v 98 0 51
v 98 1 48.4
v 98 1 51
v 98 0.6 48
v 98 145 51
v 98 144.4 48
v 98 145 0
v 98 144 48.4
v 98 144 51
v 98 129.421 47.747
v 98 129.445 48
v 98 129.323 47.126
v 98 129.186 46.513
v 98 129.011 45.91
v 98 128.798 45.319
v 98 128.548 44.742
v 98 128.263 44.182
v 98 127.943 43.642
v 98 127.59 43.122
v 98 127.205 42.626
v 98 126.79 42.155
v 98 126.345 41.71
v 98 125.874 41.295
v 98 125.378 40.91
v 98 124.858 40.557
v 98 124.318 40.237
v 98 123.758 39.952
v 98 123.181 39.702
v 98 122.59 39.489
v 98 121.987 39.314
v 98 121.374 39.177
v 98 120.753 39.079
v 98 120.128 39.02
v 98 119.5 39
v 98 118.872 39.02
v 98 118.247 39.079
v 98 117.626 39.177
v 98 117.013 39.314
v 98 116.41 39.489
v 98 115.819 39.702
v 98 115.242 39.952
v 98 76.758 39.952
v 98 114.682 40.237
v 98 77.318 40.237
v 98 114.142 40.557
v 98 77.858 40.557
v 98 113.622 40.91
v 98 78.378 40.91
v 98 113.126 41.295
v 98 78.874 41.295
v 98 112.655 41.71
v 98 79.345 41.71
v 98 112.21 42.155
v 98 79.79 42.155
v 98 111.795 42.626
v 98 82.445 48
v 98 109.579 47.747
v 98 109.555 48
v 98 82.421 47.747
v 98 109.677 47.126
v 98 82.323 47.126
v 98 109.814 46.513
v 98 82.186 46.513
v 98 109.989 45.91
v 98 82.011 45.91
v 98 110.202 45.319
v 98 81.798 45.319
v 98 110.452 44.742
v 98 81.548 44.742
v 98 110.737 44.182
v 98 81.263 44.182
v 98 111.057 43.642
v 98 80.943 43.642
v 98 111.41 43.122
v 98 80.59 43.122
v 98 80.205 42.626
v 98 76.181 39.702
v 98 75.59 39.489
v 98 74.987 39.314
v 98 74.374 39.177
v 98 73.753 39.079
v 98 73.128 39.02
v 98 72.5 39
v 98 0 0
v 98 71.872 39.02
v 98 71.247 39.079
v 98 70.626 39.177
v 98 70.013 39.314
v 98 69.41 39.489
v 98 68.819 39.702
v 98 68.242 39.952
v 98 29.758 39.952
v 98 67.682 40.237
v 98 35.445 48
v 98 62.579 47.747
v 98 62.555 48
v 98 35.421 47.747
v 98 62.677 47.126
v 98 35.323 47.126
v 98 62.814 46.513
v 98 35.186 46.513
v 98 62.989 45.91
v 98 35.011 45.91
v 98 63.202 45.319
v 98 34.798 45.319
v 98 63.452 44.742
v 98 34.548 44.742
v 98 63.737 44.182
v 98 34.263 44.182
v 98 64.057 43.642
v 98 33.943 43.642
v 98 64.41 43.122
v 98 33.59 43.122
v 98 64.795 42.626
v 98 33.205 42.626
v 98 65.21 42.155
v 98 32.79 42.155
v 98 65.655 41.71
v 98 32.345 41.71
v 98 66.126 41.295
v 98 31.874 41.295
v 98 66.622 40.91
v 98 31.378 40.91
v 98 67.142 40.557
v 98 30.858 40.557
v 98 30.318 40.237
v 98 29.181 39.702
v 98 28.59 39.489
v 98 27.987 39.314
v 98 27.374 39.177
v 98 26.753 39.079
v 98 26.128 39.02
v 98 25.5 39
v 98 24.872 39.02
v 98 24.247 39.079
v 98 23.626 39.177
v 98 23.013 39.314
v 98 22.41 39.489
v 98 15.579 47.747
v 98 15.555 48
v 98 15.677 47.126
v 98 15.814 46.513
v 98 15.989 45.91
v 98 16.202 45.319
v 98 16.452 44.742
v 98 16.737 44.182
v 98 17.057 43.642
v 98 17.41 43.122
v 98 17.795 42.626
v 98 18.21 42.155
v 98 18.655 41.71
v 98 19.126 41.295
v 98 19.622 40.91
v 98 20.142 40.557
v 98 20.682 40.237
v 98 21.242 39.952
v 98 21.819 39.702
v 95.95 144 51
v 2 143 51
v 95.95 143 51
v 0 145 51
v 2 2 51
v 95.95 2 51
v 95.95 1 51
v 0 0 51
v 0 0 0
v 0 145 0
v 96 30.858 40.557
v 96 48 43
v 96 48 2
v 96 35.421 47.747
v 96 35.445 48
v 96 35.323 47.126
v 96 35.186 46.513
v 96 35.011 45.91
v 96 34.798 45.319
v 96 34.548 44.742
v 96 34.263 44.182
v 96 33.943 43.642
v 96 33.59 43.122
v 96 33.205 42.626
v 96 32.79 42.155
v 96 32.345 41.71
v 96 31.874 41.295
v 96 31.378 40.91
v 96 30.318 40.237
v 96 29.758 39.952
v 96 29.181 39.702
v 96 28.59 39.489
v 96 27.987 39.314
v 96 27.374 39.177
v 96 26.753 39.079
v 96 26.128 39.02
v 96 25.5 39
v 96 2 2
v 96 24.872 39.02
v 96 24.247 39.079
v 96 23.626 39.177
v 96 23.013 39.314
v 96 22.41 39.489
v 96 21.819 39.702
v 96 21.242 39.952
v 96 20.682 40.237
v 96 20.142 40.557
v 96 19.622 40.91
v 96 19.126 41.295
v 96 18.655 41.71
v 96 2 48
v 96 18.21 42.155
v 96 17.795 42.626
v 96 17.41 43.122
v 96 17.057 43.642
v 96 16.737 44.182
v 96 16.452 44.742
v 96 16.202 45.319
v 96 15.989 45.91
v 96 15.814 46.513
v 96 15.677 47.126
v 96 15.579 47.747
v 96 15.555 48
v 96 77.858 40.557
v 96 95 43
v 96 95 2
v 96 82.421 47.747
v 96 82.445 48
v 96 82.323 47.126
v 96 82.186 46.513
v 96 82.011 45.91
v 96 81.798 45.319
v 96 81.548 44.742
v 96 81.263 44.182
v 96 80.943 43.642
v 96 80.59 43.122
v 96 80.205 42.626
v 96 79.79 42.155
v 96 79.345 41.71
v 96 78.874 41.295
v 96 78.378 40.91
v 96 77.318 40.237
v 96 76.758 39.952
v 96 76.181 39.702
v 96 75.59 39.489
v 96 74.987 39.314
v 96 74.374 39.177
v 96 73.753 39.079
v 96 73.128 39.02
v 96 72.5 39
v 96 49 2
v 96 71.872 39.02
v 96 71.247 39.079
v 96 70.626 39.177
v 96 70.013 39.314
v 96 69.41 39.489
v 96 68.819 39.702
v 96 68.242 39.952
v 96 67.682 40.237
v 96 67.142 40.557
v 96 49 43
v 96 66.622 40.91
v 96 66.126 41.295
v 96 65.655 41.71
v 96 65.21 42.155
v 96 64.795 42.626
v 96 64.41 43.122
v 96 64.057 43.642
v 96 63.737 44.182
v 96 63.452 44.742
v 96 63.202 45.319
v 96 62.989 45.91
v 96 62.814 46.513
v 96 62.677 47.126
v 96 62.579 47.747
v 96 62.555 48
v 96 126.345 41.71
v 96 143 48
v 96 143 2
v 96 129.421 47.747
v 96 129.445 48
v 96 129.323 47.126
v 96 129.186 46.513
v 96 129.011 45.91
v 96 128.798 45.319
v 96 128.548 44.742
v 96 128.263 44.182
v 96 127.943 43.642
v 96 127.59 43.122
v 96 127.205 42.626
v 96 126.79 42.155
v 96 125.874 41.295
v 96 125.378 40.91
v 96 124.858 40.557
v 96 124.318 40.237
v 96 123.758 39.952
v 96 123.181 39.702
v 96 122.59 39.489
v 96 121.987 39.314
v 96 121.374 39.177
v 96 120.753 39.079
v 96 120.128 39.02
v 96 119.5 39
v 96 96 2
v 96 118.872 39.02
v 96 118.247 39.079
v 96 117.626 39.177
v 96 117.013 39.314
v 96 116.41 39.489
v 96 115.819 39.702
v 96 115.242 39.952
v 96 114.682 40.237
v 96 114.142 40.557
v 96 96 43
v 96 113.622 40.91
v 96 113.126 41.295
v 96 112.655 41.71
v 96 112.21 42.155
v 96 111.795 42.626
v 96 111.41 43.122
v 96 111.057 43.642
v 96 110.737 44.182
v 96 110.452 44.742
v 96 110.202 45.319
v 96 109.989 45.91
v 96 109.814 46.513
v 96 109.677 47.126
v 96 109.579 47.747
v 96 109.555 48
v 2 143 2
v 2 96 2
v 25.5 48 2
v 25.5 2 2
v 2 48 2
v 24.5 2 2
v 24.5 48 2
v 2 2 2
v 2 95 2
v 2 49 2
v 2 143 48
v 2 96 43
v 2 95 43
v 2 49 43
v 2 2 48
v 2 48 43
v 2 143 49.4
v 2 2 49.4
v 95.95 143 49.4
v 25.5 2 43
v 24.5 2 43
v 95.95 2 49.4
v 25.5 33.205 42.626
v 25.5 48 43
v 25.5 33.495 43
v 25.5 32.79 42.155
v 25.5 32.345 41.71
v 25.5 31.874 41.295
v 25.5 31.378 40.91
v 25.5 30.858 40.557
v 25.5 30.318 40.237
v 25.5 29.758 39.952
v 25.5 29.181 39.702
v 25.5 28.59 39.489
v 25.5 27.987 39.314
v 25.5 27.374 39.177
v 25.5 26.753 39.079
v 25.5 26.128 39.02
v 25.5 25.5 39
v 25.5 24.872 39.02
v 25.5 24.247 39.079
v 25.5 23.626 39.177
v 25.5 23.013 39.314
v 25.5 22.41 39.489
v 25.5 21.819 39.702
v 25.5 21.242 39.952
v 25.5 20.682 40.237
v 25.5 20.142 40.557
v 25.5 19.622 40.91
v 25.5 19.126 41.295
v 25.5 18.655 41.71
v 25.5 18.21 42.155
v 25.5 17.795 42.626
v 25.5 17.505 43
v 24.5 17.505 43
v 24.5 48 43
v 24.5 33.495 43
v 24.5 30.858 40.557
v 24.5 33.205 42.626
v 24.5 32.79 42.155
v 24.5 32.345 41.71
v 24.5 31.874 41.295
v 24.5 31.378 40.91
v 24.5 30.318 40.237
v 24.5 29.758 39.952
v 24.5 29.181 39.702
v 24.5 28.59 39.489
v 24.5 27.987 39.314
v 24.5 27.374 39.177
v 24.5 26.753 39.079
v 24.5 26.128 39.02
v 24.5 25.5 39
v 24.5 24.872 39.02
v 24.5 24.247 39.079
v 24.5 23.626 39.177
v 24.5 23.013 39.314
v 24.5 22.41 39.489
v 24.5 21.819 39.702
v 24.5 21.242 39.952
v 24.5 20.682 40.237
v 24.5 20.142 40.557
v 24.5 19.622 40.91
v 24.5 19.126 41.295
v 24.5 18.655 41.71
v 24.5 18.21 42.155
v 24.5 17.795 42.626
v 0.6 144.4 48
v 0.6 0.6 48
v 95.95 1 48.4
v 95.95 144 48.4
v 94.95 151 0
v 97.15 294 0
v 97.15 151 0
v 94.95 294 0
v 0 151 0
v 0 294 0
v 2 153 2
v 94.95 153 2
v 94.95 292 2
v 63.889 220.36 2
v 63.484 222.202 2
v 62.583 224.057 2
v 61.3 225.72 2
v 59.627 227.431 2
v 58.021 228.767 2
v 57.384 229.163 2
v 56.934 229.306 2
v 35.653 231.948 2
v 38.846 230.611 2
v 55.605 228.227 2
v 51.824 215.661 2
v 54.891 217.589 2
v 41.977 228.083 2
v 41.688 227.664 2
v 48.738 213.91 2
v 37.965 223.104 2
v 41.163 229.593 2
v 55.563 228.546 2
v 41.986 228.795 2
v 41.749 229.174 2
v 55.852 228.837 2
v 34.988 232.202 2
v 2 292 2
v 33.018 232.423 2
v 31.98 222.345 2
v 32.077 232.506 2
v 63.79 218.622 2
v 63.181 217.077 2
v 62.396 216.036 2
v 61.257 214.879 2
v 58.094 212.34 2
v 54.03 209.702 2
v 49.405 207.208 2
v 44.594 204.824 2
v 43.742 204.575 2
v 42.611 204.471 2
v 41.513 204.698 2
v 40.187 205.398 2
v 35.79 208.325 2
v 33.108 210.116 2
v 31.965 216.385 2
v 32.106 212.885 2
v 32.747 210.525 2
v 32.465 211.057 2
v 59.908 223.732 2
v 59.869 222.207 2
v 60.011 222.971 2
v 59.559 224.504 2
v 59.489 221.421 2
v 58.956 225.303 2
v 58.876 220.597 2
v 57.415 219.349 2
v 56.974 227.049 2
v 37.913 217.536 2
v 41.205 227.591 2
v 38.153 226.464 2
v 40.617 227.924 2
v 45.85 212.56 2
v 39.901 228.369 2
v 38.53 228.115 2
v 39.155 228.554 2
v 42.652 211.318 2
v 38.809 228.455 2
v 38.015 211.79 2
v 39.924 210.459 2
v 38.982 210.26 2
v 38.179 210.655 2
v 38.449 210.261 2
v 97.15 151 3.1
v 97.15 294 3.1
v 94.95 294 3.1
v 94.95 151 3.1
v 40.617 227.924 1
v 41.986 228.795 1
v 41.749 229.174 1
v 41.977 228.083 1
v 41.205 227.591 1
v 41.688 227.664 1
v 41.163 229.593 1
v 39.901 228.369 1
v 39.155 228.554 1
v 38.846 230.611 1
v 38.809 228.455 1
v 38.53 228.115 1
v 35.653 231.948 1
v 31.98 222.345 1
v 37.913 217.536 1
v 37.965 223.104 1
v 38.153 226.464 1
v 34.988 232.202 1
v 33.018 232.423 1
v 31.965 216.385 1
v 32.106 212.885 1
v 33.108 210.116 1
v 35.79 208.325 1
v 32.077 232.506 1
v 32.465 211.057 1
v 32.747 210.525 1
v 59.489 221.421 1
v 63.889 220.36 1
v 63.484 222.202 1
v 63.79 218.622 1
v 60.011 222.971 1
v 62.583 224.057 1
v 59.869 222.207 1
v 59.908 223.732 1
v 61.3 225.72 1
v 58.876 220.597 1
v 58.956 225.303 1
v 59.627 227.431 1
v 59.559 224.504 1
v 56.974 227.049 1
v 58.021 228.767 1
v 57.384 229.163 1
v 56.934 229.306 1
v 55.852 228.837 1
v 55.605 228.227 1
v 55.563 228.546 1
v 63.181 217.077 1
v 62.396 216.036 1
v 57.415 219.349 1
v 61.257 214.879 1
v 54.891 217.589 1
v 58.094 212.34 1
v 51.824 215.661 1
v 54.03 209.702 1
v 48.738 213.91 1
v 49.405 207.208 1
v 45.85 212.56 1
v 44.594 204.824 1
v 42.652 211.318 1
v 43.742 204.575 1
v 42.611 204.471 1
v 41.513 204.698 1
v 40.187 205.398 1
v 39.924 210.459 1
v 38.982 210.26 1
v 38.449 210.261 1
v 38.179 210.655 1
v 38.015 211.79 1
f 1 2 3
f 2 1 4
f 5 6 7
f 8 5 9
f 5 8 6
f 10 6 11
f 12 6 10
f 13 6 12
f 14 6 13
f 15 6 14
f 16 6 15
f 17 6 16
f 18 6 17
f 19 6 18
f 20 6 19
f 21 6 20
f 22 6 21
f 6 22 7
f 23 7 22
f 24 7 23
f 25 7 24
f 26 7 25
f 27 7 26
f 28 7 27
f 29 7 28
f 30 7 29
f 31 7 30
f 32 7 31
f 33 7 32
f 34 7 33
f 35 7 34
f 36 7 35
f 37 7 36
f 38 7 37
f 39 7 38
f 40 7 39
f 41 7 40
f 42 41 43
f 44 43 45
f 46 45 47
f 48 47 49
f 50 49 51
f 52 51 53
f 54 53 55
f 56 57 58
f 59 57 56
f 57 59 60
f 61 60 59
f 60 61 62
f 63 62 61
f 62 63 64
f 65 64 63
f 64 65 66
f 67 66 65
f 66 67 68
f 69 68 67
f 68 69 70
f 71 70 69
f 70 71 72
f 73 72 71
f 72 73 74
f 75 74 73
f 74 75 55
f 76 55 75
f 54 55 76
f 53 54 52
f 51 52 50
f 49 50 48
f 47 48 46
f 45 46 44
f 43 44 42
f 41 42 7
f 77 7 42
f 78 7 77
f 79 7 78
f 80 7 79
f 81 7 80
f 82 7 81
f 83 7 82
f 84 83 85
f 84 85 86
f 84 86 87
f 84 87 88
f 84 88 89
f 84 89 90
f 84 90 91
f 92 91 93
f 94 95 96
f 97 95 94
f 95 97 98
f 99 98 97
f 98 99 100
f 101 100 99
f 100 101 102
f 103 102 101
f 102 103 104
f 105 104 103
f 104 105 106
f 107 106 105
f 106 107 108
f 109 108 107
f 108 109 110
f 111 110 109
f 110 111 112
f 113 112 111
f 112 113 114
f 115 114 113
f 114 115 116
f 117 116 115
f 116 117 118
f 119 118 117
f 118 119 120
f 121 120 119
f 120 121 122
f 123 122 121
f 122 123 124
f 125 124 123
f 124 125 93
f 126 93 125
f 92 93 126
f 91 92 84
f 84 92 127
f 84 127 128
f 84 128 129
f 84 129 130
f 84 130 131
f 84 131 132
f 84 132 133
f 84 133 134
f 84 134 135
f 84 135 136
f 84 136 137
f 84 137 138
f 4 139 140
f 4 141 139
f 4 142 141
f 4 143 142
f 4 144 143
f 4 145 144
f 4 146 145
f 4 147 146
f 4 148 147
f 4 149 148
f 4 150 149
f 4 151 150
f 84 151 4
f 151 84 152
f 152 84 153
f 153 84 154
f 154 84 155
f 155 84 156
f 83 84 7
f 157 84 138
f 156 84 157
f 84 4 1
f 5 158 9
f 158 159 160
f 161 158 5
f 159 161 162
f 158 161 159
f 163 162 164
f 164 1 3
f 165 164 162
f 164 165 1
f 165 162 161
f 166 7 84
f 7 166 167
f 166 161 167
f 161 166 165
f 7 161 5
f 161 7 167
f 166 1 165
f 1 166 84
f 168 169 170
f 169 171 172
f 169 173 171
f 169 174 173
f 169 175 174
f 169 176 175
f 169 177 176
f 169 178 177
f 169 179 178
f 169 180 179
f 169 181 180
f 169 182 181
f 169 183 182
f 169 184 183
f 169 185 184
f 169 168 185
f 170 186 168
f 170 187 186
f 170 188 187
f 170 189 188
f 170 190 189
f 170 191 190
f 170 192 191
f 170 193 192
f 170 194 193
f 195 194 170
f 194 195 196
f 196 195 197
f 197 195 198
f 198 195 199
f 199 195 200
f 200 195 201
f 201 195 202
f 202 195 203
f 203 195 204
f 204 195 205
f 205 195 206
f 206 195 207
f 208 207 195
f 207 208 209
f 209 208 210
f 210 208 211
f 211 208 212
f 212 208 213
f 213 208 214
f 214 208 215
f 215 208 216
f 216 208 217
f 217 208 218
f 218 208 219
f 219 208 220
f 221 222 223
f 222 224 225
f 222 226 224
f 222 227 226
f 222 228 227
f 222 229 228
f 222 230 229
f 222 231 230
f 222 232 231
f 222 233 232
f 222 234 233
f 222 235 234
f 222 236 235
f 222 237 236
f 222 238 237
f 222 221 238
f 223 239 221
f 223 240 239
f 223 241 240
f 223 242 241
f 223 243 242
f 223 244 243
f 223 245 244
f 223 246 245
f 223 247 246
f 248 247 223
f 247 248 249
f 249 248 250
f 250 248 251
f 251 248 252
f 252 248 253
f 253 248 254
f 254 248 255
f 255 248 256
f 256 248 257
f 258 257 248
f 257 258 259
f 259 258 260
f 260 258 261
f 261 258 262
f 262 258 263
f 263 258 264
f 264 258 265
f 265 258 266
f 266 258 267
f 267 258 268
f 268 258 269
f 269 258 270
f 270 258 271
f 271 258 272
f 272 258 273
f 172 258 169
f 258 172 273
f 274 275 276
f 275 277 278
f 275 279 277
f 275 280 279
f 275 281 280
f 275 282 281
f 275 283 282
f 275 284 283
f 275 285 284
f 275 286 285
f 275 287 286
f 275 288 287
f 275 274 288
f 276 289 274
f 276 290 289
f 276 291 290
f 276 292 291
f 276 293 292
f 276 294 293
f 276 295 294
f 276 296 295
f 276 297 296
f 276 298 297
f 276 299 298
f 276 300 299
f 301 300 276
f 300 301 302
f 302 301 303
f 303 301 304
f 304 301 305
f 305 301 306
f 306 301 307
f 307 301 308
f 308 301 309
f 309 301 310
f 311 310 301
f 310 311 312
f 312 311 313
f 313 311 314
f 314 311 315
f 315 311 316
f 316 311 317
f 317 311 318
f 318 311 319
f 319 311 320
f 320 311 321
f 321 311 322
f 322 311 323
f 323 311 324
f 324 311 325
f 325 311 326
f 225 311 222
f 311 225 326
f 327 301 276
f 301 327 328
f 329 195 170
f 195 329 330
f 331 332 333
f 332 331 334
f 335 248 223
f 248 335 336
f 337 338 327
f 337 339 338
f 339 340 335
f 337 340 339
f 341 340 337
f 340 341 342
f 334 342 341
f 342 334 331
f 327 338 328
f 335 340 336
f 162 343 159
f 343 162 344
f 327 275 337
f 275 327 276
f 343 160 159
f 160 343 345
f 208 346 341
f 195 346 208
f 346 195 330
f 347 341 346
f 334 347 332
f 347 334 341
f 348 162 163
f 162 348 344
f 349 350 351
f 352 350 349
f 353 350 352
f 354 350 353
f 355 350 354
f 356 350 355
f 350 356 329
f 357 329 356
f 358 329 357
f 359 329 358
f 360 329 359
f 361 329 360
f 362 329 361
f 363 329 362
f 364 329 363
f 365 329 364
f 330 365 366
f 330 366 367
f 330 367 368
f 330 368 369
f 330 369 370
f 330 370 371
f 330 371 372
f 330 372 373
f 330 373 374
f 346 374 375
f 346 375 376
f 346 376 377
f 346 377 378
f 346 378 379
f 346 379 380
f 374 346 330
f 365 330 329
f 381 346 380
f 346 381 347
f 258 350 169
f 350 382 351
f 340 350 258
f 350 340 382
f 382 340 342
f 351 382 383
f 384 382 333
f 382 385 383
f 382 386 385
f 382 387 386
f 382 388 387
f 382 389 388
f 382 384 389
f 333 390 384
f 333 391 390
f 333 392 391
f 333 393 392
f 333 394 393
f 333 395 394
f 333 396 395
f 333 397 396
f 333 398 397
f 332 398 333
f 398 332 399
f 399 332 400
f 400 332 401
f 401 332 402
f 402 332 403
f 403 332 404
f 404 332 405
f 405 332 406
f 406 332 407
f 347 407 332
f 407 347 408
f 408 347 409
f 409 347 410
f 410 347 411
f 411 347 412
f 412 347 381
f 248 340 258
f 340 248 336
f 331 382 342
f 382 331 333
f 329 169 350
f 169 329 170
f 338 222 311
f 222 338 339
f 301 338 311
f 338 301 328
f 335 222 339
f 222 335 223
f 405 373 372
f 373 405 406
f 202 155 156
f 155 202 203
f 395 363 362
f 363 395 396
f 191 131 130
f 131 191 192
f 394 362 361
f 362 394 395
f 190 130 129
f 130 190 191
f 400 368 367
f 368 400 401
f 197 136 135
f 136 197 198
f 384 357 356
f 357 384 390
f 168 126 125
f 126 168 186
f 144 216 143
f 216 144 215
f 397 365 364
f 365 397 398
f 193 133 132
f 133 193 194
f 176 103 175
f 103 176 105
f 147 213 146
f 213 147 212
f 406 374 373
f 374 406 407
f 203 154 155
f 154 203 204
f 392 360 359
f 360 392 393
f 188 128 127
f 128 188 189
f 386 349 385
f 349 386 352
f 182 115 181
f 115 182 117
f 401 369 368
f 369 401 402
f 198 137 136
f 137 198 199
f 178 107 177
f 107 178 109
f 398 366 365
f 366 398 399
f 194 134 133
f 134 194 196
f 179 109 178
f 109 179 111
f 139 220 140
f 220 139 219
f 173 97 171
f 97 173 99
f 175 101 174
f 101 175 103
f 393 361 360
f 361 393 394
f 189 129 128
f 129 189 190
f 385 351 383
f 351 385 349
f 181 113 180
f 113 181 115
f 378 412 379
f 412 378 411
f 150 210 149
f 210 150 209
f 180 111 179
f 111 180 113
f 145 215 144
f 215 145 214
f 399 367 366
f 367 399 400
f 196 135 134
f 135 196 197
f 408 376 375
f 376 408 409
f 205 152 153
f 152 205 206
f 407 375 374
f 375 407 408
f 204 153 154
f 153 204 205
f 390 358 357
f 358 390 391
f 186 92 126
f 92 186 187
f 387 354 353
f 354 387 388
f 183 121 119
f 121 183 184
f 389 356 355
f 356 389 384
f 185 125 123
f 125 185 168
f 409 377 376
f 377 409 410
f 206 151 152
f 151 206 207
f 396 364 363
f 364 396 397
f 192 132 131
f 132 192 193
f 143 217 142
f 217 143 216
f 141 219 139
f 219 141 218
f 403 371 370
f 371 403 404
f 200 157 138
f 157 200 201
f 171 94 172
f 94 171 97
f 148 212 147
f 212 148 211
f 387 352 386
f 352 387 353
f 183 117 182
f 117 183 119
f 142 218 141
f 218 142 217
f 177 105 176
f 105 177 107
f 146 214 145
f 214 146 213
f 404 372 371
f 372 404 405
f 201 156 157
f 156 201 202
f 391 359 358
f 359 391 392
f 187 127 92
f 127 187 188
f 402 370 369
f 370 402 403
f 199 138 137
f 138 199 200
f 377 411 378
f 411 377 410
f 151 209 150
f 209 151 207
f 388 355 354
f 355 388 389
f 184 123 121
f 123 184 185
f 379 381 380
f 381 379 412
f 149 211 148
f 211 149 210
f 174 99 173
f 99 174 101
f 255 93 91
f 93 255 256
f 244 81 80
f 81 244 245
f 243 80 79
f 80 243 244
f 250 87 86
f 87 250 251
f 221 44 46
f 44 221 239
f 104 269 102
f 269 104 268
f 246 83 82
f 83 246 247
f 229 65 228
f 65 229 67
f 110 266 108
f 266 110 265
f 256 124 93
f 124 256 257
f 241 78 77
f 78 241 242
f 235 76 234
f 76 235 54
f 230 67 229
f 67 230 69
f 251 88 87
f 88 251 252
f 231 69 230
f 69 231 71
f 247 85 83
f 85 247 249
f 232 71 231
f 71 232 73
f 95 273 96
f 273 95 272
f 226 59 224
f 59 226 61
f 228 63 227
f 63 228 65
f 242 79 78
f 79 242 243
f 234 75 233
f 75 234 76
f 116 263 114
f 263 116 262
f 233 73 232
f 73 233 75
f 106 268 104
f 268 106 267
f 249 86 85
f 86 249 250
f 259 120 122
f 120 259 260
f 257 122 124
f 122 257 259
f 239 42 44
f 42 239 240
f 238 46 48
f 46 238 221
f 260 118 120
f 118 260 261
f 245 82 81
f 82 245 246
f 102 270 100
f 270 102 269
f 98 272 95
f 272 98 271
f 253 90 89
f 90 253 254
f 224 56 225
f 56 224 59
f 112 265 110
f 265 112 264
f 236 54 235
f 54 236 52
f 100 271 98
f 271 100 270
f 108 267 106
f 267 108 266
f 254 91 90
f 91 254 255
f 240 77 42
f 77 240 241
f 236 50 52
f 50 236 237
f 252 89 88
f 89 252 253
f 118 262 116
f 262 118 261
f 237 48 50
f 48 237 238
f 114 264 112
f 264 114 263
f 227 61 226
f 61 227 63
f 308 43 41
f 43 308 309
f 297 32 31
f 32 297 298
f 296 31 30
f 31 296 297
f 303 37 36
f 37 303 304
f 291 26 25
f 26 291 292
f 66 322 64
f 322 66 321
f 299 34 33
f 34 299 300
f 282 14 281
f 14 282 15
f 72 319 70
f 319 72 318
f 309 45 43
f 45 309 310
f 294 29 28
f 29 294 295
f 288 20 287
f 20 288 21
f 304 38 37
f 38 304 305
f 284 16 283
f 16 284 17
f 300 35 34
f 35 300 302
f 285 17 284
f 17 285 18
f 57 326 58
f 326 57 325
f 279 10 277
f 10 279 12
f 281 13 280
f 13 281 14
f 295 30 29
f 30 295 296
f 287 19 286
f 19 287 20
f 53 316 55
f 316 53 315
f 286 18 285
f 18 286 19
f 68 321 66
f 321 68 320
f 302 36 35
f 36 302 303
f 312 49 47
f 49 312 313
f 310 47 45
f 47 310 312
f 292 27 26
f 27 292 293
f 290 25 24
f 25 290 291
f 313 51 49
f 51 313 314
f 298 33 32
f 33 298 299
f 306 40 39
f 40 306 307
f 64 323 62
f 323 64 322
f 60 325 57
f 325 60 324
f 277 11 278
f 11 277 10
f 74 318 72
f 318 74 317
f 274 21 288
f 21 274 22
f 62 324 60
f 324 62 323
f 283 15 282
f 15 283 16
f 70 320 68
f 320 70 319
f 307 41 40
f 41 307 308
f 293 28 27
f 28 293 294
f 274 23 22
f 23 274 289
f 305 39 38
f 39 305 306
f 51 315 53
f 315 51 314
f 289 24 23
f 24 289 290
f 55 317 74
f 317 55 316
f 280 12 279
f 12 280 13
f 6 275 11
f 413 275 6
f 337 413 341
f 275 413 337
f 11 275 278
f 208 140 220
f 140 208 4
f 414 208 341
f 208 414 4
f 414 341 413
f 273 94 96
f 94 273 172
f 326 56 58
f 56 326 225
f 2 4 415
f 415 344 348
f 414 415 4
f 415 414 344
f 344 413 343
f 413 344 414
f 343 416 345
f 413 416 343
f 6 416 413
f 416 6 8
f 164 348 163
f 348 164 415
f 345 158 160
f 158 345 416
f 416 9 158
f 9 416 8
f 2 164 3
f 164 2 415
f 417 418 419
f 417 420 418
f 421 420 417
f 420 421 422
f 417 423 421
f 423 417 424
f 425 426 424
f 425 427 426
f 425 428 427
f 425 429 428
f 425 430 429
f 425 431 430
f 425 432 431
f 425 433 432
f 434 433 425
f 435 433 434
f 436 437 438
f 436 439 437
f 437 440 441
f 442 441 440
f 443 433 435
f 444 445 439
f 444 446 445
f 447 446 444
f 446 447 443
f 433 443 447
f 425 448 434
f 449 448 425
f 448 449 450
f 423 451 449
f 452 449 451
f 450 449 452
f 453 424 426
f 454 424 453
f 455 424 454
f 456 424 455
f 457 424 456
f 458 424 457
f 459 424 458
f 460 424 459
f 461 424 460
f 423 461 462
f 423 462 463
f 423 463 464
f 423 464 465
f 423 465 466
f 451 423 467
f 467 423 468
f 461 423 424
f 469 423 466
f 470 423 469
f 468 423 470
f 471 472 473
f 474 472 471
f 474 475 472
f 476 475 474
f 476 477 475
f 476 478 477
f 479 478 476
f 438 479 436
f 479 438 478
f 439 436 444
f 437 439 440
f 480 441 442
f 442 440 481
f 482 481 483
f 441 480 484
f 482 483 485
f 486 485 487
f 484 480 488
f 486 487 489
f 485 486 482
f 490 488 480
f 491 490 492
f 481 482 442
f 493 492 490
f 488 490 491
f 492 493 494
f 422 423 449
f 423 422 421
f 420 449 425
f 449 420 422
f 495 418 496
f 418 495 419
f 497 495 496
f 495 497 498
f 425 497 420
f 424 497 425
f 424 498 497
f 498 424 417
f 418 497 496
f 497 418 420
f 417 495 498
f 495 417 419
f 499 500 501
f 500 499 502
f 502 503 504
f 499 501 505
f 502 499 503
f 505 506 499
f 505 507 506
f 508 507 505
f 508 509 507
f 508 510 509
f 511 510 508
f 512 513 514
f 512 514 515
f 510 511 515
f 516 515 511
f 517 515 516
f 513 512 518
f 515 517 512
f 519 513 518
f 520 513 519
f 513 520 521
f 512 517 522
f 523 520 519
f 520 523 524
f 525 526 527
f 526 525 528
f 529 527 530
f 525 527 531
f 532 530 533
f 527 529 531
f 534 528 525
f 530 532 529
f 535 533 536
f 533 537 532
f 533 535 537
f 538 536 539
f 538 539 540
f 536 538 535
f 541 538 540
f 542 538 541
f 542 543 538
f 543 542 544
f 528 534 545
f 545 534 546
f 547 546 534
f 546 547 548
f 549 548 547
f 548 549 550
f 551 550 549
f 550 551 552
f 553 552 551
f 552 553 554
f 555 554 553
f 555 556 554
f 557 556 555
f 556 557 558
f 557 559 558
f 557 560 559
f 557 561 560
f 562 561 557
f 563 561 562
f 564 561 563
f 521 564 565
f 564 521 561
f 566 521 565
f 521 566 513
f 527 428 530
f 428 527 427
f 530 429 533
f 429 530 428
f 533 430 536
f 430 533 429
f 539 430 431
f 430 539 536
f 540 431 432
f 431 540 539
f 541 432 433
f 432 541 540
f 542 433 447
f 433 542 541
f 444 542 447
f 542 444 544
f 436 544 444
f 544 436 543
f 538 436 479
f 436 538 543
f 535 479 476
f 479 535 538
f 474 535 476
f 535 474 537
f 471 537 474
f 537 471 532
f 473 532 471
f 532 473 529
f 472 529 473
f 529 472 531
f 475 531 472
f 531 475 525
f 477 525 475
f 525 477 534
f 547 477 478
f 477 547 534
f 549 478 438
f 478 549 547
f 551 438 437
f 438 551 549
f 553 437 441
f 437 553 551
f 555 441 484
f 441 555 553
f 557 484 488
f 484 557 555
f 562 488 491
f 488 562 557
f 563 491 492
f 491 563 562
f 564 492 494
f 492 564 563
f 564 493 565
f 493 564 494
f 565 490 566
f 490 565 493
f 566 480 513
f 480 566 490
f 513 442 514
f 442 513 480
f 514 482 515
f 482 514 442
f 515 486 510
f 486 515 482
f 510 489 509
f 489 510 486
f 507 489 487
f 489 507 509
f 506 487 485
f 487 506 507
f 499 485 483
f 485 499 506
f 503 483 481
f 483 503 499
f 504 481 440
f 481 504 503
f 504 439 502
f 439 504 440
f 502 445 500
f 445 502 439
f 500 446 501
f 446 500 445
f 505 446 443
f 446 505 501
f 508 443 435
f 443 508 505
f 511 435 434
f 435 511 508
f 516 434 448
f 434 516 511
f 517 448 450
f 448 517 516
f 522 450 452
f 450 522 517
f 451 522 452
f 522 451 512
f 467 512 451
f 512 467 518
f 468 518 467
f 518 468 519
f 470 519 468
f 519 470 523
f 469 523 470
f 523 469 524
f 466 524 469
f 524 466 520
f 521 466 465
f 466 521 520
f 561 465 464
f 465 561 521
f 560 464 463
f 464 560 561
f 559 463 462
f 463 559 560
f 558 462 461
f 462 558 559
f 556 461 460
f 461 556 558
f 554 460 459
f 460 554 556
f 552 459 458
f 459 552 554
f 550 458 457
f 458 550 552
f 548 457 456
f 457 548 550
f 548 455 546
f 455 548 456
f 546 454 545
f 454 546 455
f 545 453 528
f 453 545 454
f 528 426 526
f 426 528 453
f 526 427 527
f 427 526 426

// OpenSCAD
// file: carcassonne_box.scad
/**
 * @file carcassonne_box.scad
 * @author Conlan Wesson
 * Template for Carcossonne boxes.
 * @copyright Creative Commons Attribution-NonCommercial-ShareAlike 4.0
 */

mm = 1;
cm = 10*mm;

width = 47*mm;
thick = 2.5*mm;
wall = 2*mm;

/**
 * Lid for box.
 * @param count Number of cards.
 * @param columns Number of columns.
 * @param icon Path to icon DXF file.
 * @param rot Icon rotation in degrees.
 * @param mult Icon scale.
 * @param xoff X-offset of icon from center.
 * @param yoff Y-offset of icon from center.
 */
module carcassonne_lid(count, columns=1, icon=false, rot=0, mult=1, xoff=0, yoff=0, g=0){
	length = (thick * count) + ((width/2) - ((thick * count) % (width/2)));
	w = length+(1.5*wall)+.1;
	l = (width*columns)+wall;
	h = wall;
	d = 2;

	CubePoints = [
		[ 0-g, 0-g,   0 ],  //0
		[ w+g, 0-g,   0 ],  //1
		[ w+g, l+g,   0 ],  //2
		[ 0-g, l+g,   0 ],  //3
		[   d,   d, h+g ],  //4
		[   w,   d, h+g ],  //5
		[   w, l-d, h+g ],  //6
		[   d, l-d, h+g ]   //7
	];
	
	CubeFaces = [
		[0,1,2,3],  // bottom
		[4,5,1,0],  // front
		[7,6,5,4],  // top
		[5,6,2,1],  // right
		[6,7,3,2],  // back
		[7,4,0,3]   // left
	];
	
	
	difference(){
		union(){
			polyhedron( CubePoints, CubeFaces );
			translate([w-wall-.15,0,0]) cube([wall+.2,l, (1.5*wall)+.1]);
		}
		if(icon){
			translate([w/2+xoff,l/3+yoff,h-(wall/2)]){
				linear_extrude(height=(wall)+.1){
					rotate(rot) scale(mult) import(icon);
				}
			}
		}
	}
}

/**
 * Carcassonne card box.
 * @param count Number of cards.
 * @param dividers Array of divider positions.
 * @param columns Number of columns.
 */
module carcassonne_box(count, dividers=[], columns=1){
	length = (thick * count) + ((width/2) - ((thick * count) % (width/2)));
	difference(){
		union(){
			difference(){
				// Outer walls
				cube([length+(2*wall), (width*columns)+(2*wall), width+(2*wall)]);
				// Cavity
				translate([wall, wall, wall]){
					cube([length, width*columns, (width+wall)+.1]);
				}
			}
			// Dividers
			for(col = [0:columns-1]){
				for(div = dividers[col]){
					translate([(div*(width/2))+(wall/2), width*col+wall, 0]) cube([wall/2, width, width-(2*wall)]);
				}
				if(col > 0){
					translate([0, width*col+(wall/2), 0]) cube([length+(2*wall), wall/2, width-(2*wall)]);
				}
			}
		}
		union(){
			// Notch
			for(col = [0:columns-1]){
				translate([wall, wall+(width*col), wall]){
					translate([0, width/2, width])
					rotate([0, 90, 0]){
						cylinder(r=10, h=length+(2*wall), $fn=100);
					}
				}
			}
			// Track
			translate([wall/2,wall/2,width+wall/2]) carcassonne_lid(count, columns, g=0.4);
		}
	}
}
// main file
/**
 * @file main.scad
 * @author Conlan Wesson
 * Carcossonne main box.
 * @copyright Creative Commons Attribution-NonCommercial-ShareAlike 4.0
 */

include <carcassonne_box.scad>

count = 30;
dividers = [[1]];
columns = 3;

carcassonne_box(count, dividers, columns);
translate([0,width*columns+10,0]) carcassonne_lid(count, columns, icon="main.dxf", rot=90, mult=1, xoff=30, yoff=-10);
